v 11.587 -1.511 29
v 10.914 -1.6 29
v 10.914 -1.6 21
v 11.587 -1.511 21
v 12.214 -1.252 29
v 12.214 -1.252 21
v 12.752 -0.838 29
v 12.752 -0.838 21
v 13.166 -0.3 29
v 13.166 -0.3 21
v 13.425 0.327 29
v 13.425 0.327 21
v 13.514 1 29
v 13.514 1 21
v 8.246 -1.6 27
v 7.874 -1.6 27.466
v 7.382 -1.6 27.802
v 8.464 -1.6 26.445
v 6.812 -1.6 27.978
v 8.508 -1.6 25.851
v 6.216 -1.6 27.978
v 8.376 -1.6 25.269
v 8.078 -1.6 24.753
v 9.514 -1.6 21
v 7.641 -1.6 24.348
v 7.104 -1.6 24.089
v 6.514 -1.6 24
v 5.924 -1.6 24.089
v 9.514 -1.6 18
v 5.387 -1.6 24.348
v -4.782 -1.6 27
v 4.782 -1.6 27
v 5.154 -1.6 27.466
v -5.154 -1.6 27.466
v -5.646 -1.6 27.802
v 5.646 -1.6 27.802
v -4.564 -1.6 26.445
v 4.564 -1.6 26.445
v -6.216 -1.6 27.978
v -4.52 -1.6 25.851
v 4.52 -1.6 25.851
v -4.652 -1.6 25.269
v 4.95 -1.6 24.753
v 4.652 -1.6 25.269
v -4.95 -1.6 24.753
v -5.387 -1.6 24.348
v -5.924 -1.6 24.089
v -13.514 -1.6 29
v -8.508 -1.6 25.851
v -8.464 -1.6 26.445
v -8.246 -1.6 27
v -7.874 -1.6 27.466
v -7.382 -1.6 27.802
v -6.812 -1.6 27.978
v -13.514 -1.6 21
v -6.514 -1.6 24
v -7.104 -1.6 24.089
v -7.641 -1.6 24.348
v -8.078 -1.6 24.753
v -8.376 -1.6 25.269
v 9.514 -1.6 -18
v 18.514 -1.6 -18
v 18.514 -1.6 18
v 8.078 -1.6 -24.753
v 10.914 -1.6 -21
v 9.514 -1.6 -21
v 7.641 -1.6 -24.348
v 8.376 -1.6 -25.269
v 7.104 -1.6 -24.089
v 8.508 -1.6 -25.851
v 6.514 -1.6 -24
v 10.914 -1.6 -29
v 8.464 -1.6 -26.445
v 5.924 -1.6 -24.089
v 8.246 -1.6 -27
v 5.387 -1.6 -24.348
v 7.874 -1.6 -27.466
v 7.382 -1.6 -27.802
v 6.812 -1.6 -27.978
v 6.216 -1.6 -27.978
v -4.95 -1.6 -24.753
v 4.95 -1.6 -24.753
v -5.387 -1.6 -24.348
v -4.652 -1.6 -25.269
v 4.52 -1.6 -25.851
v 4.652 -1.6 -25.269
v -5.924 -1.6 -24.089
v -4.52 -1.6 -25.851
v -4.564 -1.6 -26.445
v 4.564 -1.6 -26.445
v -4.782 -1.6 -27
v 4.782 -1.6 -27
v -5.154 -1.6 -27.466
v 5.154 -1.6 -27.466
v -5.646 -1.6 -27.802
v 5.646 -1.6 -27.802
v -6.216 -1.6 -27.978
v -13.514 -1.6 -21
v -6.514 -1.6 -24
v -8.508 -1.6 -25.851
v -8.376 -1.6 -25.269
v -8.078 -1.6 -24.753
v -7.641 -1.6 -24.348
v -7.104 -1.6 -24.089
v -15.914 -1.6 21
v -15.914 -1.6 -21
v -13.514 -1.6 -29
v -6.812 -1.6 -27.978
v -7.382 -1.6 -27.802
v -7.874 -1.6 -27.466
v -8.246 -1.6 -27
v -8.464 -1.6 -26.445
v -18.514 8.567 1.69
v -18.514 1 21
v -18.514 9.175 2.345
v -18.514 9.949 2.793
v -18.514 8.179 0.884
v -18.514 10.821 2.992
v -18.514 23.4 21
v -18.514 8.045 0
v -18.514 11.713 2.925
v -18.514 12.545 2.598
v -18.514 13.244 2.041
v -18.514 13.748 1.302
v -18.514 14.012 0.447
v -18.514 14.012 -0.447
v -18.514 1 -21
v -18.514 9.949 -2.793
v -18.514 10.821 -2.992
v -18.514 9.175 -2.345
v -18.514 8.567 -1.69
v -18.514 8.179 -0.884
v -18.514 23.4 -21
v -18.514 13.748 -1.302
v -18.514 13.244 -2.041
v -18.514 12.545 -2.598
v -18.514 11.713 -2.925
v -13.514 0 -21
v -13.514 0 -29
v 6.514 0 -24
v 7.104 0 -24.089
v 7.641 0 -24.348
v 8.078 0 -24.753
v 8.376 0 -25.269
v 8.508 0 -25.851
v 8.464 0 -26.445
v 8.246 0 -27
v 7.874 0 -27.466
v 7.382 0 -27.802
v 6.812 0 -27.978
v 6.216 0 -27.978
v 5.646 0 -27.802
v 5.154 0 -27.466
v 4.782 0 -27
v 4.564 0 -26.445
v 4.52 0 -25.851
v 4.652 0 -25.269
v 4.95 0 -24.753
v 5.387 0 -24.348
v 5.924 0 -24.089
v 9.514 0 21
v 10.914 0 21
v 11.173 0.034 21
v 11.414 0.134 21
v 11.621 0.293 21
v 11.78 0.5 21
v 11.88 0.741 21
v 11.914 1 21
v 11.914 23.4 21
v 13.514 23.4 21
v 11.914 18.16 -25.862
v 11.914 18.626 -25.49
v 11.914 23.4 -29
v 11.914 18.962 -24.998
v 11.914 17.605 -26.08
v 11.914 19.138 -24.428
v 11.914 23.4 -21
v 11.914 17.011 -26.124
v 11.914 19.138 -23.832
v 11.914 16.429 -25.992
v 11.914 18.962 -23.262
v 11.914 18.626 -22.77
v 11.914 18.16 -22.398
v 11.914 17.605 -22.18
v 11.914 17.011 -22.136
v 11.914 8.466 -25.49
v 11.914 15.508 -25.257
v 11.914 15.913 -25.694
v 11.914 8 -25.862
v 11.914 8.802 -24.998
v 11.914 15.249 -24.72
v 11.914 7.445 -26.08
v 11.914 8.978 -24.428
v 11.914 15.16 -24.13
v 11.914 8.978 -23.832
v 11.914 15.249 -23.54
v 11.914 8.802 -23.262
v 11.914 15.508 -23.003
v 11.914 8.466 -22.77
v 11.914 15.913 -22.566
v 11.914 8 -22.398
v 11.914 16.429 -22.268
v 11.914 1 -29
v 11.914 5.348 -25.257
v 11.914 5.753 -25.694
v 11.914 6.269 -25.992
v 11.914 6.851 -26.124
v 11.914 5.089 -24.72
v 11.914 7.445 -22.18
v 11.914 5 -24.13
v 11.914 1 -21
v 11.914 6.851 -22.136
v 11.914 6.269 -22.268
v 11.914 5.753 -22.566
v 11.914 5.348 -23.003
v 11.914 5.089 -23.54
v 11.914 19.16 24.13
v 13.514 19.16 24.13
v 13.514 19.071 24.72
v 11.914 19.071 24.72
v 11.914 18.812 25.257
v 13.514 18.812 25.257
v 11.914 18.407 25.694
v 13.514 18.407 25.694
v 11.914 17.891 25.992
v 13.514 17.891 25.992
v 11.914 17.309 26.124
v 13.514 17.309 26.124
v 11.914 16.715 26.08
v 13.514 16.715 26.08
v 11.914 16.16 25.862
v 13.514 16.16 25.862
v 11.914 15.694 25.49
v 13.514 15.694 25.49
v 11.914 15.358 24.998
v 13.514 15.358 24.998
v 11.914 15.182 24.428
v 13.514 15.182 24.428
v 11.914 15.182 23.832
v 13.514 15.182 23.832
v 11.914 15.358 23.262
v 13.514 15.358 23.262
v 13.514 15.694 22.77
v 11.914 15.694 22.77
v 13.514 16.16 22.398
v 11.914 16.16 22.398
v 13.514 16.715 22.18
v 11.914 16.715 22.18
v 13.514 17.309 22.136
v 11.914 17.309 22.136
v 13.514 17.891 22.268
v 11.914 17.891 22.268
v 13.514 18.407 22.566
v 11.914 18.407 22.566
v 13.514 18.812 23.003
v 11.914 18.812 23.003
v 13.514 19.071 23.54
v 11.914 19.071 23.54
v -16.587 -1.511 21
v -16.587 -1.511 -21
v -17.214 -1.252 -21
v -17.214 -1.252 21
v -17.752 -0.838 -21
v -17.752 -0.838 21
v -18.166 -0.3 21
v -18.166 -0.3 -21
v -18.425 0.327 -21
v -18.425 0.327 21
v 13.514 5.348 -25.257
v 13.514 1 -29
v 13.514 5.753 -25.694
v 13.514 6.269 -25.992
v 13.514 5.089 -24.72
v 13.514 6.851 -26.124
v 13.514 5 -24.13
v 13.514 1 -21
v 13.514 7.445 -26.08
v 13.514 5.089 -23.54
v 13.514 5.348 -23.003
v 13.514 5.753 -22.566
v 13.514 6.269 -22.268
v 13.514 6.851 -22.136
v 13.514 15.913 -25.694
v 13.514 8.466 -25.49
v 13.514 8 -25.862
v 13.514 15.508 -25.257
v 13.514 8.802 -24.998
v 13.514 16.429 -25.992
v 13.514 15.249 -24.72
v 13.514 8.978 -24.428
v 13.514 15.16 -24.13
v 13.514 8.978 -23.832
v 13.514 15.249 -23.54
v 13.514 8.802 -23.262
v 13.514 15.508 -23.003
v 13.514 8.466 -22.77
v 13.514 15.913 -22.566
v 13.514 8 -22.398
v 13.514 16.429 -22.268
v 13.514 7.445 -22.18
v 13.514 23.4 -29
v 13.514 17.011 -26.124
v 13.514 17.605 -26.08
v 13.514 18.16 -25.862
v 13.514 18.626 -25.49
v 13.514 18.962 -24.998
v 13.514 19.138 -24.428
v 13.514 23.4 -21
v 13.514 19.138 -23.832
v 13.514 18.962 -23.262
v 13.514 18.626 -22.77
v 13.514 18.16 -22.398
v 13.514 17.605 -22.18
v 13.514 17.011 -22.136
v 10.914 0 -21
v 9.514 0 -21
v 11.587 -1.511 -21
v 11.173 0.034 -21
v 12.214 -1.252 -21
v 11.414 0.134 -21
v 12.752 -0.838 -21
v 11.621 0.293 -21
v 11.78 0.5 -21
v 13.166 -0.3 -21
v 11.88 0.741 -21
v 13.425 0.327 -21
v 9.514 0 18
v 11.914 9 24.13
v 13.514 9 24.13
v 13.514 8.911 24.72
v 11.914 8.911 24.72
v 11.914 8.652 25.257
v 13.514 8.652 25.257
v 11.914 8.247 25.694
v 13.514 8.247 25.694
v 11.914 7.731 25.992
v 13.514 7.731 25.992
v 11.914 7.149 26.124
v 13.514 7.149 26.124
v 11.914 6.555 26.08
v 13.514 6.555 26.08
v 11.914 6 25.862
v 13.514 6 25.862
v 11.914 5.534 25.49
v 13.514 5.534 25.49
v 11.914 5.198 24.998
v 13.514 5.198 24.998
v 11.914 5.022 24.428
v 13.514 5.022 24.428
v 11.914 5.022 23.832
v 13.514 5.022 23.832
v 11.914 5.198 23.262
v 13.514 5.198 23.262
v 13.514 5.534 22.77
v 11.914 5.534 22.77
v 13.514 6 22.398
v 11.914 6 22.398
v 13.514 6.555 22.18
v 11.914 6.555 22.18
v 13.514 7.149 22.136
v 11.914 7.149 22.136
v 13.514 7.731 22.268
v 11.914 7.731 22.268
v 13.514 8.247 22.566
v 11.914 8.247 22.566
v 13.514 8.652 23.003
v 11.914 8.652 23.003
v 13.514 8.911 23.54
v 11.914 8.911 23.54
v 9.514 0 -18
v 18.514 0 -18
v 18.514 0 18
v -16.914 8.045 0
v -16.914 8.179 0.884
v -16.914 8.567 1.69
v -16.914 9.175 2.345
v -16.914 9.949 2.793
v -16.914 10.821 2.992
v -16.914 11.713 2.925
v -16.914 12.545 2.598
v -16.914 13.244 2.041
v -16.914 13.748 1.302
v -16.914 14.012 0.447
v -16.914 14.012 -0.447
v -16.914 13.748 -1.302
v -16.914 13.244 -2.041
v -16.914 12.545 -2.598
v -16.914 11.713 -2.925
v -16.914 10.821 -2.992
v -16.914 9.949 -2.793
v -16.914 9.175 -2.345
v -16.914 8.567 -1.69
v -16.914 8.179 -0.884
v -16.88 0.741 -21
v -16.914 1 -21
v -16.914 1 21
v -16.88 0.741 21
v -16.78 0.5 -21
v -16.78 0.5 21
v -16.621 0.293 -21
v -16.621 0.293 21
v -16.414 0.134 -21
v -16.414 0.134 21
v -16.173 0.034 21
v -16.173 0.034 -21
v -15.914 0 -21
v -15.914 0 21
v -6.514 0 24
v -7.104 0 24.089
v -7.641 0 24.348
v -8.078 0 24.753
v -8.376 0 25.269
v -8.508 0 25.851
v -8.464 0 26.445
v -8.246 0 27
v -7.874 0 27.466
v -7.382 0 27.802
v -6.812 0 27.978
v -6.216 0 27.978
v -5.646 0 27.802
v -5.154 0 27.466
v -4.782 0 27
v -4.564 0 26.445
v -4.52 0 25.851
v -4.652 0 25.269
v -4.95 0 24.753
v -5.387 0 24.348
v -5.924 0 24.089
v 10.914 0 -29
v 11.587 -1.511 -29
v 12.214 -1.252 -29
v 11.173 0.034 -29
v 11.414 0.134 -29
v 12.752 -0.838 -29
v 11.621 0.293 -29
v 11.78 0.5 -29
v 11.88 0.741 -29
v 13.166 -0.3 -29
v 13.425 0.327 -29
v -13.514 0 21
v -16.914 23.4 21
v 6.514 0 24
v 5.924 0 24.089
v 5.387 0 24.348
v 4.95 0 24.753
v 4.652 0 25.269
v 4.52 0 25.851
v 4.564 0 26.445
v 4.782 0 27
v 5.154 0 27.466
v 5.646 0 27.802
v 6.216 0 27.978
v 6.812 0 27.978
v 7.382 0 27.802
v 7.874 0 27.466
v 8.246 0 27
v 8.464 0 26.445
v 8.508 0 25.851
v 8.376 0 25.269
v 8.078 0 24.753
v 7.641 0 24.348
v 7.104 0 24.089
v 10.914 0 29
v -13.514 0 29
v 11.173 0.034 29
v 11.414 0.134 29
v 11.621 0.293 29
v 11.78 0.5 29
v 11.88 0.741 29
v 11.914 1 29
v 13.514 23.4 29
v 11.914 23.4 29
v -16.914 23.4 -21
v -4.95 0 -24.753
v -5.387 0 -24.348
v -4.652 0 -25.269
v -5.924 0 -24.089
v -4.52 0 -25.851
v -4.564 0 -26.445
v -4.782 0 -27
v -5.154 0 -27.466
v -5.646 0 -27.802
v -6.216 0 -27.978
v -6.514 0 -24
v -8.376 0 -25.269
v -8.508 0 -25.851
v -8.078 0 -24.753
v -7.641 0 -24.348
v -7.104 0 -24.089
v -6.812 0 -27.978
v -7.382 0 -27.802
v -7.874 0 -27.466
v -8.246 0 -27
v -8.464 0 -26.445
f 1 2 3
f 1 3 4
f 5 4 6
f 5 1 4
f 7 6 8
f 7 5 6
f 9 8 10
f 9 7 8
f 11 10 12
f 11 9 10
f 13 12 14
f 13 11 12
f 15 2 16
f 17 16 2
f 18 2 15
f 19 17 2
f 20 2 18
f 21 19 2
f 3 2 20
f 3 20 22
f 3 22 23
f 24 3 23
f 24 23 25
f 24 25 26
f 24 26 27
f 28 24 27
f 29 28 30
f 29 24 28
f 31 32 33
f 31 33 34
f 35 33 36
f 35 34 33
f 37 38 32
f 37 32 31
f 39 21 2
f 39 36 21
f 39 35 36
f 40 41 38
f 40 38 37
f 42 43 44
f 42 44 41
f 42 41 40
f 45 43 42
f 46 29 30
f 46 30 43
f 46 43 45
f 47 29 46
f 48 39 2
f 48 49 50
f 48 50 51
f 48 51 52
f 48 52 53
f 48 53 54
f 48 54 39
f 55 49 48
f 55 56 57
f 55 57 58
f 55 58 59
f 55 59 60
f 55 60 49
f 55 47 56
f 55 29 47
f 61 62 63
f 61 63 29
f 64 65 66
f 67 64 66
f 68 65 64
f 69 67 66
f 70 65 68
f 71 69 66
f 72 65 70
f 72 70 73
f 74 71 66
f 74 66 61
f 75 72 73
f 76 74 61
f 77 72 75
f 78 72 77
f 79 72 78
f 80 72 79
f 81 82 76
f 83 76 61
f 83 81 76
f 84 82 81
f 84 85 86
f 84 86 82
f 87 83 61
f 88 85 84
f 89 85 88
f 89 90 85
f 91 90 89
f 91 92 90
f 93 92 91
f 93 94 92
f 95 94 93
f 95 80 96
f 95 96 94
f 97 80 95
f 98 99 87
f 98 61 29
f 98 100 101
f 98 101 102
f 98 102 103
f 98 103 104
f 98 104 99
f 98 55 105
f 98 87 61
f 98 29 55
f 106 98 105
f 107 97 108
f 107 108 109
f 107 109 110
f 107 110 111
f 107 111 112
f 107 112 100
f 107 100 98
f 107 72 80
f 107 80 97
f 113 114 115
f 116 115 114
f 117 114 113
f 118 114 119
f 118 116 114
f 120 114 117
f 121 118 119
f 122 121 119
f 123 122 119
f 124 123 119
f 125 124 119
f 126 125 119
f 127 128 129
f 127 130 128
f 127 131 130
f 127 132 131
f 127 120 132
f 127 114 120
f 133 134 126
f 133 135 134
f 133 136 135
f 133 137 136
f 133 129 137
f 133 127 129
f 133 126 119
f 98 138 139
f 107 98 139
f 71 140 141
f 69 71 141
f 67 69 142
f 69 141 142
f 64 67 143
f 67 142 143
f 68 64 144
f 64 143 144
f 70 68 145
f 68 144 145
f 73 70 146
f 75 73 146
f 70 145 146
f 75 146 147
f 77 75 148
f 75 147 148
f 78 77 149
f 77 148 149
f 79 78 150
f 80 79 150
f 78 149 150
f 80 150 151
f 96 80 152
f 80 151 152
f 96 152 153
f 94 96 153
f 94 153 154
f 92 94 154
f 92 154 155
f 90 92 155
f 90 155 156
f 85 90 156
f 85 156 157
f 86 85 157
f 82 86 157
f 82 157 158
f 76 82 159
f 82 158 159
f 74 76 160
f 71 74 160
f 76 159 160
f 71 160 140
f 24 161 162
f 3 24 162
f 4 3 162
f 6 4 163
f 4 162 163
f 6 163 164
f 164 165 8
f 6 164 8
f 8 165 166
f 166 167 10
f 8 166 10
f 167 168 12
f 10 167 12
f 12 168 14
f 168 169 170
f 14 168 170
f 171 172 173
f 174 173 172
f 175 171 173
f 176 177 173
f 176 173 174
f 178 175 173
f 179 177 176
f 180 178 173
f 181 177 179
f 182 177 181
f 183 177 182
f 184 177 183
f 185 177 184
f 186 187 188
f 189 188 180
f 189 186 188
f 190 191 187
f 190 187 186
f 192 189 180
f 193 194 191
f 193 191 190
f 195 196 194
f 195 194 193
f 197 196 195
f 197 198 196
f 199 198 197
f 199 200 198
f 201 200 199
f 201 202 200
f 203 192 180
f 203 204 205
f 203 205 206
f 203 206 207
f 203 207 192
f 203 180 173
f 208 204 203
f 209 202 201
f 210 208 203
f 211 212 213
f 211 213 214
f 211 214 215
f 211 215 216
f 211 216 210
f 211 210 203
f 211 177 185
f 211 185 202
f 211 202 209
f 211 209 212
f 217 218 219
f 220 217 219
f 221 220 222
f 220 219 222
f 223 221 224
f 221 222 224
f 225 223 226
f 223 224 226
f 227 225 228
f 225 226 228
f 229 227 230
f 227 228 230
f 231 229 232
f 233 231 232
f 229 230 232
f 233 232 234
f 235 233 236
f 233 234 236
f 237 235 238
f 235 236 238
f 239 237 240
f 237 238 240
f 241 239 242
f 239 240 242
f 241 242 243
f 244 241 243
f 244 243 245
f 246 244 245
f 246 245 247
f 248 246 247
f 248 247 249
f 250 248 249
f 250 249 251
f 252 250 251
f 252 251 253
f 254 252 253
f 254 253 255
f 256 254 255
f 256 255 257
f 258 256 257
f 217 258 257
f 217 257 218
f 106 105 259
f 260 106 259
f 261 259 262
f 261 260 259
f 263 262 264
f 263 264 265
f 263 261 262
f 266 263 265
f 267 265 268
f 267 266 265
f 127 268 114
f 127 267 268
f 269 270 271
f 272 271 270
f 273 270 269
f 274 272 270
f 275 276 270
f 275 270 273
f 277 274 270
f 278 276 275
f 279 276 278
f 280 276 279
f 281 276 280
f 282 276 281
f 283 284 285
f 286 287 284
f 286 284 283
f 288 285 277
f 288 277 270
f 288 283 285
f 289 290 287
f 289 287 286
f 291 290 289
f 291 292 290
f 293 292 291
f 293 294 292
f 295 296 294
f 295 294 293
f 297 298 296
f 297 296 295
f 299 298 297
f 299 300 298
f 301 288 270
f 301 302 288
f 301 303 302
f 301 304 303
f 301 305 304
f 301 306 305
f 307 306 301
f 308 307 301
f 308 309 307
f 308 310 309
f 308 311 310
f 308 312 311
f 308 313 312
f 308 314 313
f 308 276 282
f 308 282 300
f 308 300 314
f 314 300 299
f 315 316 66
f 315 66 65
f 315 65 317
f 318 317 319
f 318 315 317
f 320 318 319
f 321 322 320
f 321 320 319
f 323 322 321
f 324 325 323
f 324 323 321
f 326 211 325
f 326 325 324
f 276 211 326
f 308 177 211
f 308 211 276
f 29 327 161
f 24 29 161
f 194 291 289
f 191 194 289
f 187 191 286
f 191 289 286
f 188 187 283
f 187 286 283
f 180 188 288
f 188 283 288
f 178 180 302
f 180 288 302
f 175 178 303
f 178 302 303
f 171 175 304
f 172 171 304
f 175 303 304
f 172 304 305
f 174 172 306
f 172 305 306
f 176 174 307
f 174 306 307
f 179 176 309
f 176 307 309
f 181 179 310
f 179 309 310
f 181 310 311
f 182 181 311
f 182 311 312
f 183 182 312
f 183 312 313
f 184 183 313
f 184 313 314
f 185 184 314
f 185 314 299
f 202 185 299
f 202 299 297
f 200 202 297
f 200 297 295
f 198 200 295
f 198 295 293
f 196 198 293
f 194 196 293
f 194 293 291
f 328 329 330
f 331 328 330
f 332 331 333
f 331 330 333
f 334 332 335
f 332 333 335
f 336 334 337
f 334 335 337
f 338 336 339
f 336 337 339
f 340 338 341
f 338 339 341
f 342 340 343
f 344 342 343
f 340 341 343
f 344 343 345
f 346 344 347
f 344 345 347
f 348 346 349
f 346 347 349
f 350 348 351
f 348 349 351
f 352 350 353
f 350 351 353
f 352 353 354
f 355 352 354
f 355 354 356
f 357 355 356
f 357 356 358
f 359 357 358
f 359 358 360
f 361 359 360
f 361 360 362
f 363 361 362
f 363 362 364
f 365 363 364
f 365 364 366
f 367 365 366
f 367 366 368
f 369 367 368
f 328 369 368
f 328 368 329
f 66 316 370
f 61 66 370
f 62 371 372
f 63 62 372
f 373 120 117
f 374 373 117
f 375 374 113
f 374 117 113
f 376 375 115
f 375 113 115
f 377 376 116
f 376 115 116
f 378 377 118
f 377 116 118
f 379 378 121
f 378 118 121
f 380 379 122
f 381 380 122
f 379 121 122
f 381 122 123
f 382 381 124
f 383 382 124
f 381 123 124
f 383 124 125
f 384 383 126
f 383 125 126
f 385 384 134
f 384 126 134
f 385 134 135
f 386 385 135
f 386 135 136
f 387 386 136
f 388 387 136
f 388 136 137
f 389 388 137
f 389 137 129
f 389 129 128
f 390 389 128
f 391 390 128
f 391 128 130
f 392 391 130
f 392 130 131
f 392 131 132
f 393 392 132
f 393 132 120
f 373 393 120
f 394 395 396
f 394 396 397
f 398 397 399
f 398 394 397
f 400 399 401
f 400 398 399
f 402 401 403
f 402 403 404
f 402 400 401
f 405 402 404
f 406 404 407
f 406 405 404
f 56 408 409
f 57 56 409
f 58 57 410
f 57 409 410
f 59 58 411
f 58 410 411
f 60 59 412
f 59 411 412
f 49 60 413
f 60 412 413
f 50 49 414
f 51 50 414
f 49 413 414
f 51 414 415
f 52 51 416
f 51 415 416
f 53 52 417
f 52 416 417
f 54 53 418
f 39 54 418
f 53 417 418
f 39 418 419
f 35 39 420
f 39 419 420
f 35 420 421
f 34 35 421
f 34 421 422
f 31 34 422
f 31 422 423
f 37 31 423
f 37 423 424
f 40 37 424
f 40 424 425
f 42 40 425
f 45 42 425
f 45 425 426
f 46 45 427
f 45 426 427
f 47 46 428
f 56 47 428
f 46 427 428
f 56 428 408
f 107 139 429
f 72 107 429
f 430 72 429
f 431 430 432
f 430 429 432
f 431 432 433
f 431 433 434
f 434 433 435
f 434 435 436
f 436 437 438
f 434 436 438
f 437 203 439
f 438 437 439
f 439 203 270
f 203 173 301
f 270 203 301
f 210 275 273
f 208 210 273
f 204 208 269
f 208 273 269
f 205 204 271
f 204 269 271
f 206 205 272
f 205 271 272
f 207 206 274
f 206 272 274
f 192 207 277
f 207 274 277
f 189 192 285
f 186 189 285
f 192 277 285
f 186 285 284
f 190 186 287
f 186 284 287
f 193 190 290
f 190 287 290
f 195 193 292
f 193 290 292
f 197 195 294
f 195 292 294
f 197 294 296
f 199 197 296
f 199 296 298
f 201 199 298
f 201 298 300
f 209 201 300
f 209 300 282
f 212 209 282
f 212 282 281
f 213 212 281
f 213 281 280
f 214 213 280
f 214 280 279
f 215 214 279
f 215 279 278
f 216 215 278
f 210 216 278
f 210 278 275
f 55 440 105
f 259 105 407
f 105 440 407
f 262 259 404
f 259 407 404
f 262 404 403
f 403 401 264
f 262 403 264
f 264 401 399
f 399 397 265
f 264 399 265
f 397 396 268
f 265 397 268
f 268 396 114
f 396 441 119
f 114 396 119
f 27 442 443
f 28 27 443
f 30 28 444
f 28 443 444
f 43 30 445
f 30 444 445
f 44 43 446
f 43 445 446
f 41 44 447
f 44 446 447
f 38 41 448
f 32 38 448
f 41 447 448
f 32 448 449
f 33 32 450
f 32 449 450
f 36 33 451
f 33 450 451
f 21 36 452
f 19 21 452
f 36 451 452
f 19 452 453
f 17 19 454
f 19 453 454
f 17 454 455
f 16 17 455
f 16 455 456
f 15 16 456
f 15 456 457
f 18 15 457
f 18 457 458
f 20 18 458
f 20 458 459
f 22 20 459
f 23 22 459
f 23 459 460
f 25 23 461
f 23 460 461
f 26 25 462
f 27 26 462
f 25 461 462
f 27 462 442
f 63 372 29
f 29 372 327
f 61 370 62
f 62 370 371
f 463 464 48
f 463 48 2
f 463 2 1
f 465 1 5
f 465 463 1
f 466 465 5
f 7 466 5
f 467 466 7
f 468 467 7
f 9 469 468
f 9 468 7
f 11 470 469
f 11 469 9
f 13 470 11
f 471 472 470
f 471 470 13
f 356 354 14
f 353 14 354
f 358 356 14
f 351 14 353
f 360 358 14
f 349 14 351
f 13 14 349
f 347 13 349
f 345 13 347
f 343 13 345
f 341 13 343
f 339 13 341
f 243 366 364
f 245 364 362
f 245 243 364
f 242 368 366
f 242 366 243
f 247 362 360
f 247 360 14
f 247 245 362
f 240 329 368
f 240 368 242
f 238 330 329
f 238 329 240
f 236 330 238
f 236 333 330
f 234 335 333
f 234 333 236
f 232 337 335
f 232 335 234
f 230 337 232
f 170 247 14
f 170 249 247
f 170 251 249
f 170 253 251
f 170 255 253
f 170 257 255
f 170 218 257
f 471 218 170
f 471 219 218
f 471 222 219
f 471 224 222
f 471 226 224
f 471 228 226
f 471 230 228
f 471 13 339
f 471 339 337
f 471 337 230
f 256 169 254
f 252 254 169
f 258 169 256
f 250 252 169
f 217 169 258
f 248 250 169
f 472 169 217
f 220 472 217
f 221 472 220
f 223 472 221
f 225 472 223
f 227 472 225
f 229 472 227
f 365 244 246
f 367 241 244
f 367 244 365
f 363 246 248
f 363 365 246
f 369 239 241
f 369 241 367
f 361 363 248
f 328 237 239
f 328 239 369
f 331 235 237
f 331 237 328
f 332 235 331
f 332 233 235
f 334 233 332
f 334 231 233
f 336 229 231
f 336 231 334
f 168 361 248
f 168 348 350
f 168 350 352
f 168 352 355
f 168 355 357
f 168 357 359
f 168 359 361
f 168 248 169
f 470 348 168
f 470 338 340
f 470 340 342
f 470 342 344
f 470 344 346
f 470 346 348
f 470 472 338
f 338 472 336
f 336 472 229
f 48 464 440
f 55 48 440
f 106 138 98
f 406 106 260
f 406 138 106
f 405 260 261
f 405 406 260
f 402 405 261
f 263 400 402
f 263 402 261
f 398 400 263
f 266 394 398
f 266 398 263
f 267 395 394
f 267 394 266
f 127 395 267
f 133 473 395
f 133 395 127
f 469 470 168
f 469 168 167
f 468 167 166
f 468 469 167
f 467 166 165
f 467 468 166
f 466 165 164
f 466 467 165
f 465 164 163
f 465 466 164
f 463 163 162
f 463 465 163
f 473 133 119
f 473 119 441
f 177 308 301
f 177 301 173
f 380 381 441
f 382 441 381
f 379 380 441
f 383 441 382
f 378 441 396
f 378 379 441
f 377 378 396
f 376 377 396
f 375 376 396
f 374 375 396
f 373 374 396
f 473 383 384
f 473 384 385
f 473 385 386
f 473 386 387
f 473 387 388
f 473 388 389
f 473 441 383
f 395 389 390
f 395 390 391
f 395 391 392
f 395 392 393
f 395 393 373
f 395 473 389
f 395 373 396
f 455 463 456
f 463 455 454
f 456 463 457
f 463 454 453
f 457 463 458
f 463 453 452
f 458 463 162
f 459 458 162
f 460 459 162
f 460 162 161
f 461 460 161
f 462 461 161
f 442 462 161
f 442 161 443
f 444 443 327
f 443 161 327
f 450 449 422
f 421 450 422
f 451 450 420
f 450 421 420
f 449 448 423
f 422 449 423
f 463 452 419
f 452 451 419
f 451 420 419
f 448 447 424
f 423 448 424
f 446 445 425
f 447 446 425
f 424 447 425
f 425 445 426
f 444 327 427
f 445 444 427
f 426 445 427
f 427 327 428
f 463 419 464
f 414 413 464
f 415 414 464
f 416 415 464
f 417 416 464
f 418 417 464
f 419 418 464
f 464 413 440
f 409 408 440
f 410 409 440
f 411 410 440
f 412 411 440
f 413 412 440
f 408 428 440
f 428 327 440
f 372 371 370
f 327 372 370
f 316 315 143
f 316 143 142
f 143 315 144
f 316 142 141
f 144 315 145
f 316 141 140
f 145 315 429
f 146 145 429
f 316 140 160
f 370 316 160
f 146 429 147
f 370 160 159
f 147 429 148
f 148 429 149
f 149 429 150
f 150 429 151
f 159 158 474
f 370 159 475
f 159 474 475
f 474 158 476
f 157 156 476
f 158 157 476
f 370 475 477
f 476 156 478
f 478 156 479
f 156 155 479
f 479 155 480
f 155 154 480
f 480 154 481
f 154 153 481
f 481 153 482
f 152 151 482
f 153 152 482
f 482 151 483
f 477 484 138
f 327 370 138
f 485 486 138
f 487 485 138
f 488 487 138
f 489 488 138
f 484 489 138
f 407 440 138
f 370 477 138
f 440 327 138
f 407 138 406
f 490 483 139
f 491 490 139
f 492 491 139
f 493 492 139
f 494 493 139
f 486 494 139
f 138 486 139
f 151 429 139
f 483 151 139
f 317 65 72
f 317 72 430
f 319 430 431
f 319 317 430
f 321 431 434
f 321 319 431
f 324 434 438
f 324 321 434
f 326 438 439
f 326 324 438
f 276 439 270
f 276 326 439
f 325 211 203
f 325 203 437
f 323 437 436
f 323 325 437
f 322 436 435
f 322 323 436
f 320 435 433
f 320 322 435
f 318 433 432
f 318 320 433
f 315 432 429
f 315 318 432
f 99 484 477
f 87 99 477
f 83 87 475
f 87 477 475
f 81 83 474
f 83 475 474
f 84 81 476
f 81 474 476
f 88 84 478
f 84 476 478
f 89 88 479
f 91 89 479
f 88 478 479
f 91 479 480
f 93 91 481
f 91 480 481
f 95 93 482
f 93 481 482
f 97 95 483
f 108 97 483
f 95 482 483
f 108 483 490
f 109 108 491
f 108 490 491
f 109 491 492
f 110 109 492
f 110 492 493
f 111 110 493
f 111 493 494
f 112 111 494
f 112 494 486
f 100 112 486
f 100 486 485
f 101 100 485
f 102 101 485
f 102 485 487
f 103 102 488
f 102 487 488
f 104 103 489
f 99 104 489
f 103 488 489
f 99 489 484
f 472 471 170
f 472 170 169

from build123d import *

# Parameters (mm, degrees)
SKETCH1_R                      = 2
BASE_FLANGE1_DEPTH             = 1.6
EDGE_FLANGE1_STRIP_W           = 8.4
EDGE_FLANGE1_STRIP_H           = 1.6
EDGE_FLANGE1_STRIP_CUT_DEPTH   = 8
EDGE_FLANGE1_STRIP_2_W         = 8.4
EDGE_FLANGE1_STRIP_2_H         = 1.6
EDGE_FLANGE1_STRIP_CUT_2_DEPTH = 8
EDGE_FLANGE1_STRIP_3_W         = 8.4
EDGE_FLANGE1_STRIP_3_H         = 1.6
EDGE_FLANGE1_STRIP_CUT_3_DEPTH = 42
EDGE_FLANGE1_DEPTH             = 8
EDGE_FLANGE1_BEND_DEPTH        = 8
EDGE_FLANGE1_BEND_2_DEPTH      = 42
CUT_EXTRUDE1_REACH             = 54.532
SKETCH14_R                     = 3
CUT_EXTRUDE2_REACH             = 51.136
SKETCH15_R                     = 2


# Sheet-metal steps are written as plain solids
with BuildPart() as part:
    # Sketch1 → Base-Flange1 (new body)
    with BuildSketch(Plane(origin=(0, 0, 0), x_dir=(1, 0, 0), z_dir=(0, 1, 0))):
        Polygon((-18.514, 21), (-13.514, 21), (-13.514, 29), (13.514, 29), (13.514, 21), (9.514, 21), (9.514, 18), (18.514, 18), (18.514, -18), (9.514, -18), (9.514, -21), (13.514, -21), (13.514, -29), (-13.514, -29), (-13.514, -21), (-18.514, -21), align=None)
        with Locations(Location((-6.514, 26, 0), (0, 0, 270))):
            Circle(SKETCH1_R, mode=Mode.SUBTRACT)
        with Locations(Location((6.514, 26, 0), (0, 0, 270))):
            Circle(SKETCH1_R, mode=Mode.SUBTRACT)
        with Locations(Location((6.514, -26, 0), (0, 0, 90))):
            Circle(SKETCH1_R, mode=Mode.SUBTRACT)
        with Locations(Location((-6.514, -26, 0), (0, 0, 90))):
            Circle(SKETCH1_R, mode=Mode.SUBTRACT)
    extrude(amount=-BASE_FLANGE1_DEPTH)

    # Edge-Flange1 strip (across the edge) → Edge-Flange1 strip cut (cut)
    with BuildSketch(Plane(origin=(13.514, 0, 29), x_dir=(-1, 0, 0), z_dir=(0, 0, -1))):
        with Locations((-1.6, -0.8)):
            Rectangle(EDGE_FLANGE1_STRIP_W, EDGE_FLANGE1_STRIP_H)
    extrude(amount=EDGE_FLANGE1_STRIP_CUT_DEPTH, mode=Mode.SUBTRACT)

    # Edge-Flange1 strip 2 (across the edge) → Edge-Flange1 strip cut 2 (cut)
    with BuildSketch(Plane(origin=(13.514, 0, -21), x_dir=(-1, 0, 0), z_dir=(0, 0, -1))):
        with Locations((-1.6, -0.8)):
            Rectangle(EDGE_FLANGE1_STRIP_2_W, EDGE_FLANGE1_STRIP_2_H)
    extrude(amount=EDGE_FLANGE1_STRIP_CUT_2_DEPTH, mode=Mode.SUBTRACT)

    # Edge-Flange1 strip 3 (across the edge) → Edge-Flange1 strip cut 3 (cut)
    with BuildSketch(Plane(origin=(-18.514, 0, -21), x_dir=(1, 0, 0), z_dir=(0, 0, 1))):
        with Locations((-1.6, -0.8)):
            Rectangle(EDGE_FLANGE1_STRIP_3_W, EDGE_FLANGE1_STRIP_3_H)
    extrude(amount=EDGE_FLANGE1_STRIP_CUT_3_DEPTH, mode=Mode.SUBTRACT)

    # Edge-Flange1 section (across the edge) → Edge-Flange1 (add)
    with BuildSketch(Plane(origin=(13.514, 0, 29), x_dir=(-1, 0, 0), z_dir=(0, 0, -1))):
        with BuildLine():
            Line((0, 1), (0, 23.4))
            Line((0, 23.4), (1.6, 23.4))
            Line((1.6, 23.4), (1.6, 1))
            ThreePointArc((1.6, 1), (1.892893219, 0.292893219), (2.6, 0))
            Line((2.6, 0), (2.6, -1.6))
            ThreePointArc((2.6, -1.6), (0.761522369, -0.838477631), (0, 1))
        make_face()
    extrude(amount=EDGE_FLANGE1_DEPTH)

    # Edge-Flange1 section 2 (across the edge) → Edge-Flange1 bend (add)
    with BuildSketch(Plane(origin=(13.514, 0, -21), x_dir=(-1, 0, 0), z_dir=(0, 0, -1))):
        with BuildLine():
            Line((0, 1), (0, 23.4))
            Line((0, 23.4), (1.6, 23.4))
            Line((1.6, 23.4), (1.6, 1))
            ThreePointArc((1.6, 1), (1.892893219, 0.292893219), (2.6, 0))
            Line((2.6, 0), (2.6, -1.6))
            ThreePointArc((2.6, -1.6), (0.761522369, -0.838477631), (0, 1))
        make_face()
    extrude(amount=EDGE_FLANGE1_BEND_DEPTH)

    # Edge-Flange1 section 3 (across the edge) → Edge-Flange1 bend 2 (add)
    with BuildSketch(Plane(origin=(-18.514, 0, -21), x_dir=(1, 0, 0), z_dir=(0, 0, 1))):
        with BuildLine():
            Line((0, 1), (0, 23.4))
            Line((0, 23.4), (1.6, 23.4))
            Line((1.6, 23.4), (1.6, 1))
            ThreePointArc((1.6, 1), (1.892893219, 0.292893219), (2.6, 0))
            Line((2.6, 0), (2.6, -1.6))
            ThreePointArc((2.6, -1.6), (0.761522369, -0.838477631), (0, 1))
        make_face()
    extrude(amount=EDGE_FLANGE1_BEND_2_DEPTH)

    # Sketch14 → Cut-Extrude1 (cut, up to next)
    with BuildSketch(Plane.ZY.offset(18.514), mode=Mode.PRIVATE) as cut_extrude1_sk1:
        with Locations(Location((0, 11.045309813, 0), (0, 0, 270))):
            Circle(SKETCH14_R)
    cut_extrude1_tool1 = extrude(cut_extrude1_sk1.sketch, amount=-CUT_EXTRUDE1_REACH, mode=Mode.PRIVATE) & part.part
    add(cut_extrude1_tool1.solids().sort_by_distance((-18.514, 11.04531, 0))[0], mode=Mode.SUBTRACT)

    # Sketch15 → Cut-Extrude2 (cut, up to next)
    with BuildSketch(Plane(origin=(13.514, 0, 0), x_dir=(0, 0, -1), z_dir=(1, 0, 0)), mode=Mode.PRIVATE) as cut_extrude2_sk1:
        with Locations(Location((-24.13, 7, 0), (0, 0, 90))):
            Circle(SKETCH15_R)
    cut_extrude2_tool1 = extrude(cut_extrude2_sk1.sketch, amount=-CUT_EXTRUDE2_REACH, mode=Mode.PRIVATE) & part.part
    # Sketch15 → Cut-Extrude2 (cut, up to next)
    with BuildSketch(Plane(origin=(13.514, 0, 0), x_dir=(0, 0, -1), z_dir=(1, 0, 0)), mode=Mode.PRIVATE) as cut_extrude2_sk2:
        with Locations(Location((-24.13, 17.16, 0), (0, 0, 90))):
            Circle(SKETCH15_R)
    cut_extrude2_tool2 = extrude(cut_extrude2_sk2.sketch, amount=-CUT_EXTRUDE2_REACH, mode=Mode.PRIVATE) & part.part
    # Sketch15 → Cut-Extrude2 (cut, up to next)
    with BuildSketch(Plane(origin=(13.514, 0, 0), x_dir=(0, 0, -1), z_dir=(1, 0, 0)), mode=Mode.PRIVATE) as cut_extrude2_sk3:
        with Locations(Location((24.13, 7, 0), (0, 0, 270))):
            Circle(SKETCH15_R)
    cut_extrude2_tool3 = extrude(cut_extrude2_sk3.sketch, amount=-CUT_EXTRUDE2_REACH, mode=Mode.PRIVATE) & part.part
    # Sketch15 → Cut-Extrude2 (cut, up to next)
    with BuildSketch(Plane(origin=(13.514, 0, 0), x_dir=(0, 0, -1), z_dir=(1, 0, 0)), mode=Mode.PRIVATE) as cut_extrude2_sk4:
        with Locations(Location((24.13, 17.16, 0), (0, 0, 270))):
            Circle(SKETCH15_R)
    cut_extrude2_tool4 = extrude(cut_extrude2_sk4.sketch, amount=-CUT_EXTRUDE2_REACH, mode=Mode.PRIVATE) & part.part
    add(cut_extrude2_tool1.solids().sort_by_distance((13.514, 7, 24.13))[0], mode=Mode.SUBTRACT)
    add(cut_extrude2_tool2.solids().sort_by_distance((13.514, 17.16, 24.13))[0], mode=Mode.SUBTRACT)
    add(cut_extrude2_tool3.solids().sort_by_distance((13.514, 7, -24.13))[0], mode=Mode.SUBTRACT)
    add(cut_extrude2_tool4.solids().sort_by_distance((13.514, 17.16, -24.13))[0], mode=Mode.SUBTRACT)


solid = part.part
